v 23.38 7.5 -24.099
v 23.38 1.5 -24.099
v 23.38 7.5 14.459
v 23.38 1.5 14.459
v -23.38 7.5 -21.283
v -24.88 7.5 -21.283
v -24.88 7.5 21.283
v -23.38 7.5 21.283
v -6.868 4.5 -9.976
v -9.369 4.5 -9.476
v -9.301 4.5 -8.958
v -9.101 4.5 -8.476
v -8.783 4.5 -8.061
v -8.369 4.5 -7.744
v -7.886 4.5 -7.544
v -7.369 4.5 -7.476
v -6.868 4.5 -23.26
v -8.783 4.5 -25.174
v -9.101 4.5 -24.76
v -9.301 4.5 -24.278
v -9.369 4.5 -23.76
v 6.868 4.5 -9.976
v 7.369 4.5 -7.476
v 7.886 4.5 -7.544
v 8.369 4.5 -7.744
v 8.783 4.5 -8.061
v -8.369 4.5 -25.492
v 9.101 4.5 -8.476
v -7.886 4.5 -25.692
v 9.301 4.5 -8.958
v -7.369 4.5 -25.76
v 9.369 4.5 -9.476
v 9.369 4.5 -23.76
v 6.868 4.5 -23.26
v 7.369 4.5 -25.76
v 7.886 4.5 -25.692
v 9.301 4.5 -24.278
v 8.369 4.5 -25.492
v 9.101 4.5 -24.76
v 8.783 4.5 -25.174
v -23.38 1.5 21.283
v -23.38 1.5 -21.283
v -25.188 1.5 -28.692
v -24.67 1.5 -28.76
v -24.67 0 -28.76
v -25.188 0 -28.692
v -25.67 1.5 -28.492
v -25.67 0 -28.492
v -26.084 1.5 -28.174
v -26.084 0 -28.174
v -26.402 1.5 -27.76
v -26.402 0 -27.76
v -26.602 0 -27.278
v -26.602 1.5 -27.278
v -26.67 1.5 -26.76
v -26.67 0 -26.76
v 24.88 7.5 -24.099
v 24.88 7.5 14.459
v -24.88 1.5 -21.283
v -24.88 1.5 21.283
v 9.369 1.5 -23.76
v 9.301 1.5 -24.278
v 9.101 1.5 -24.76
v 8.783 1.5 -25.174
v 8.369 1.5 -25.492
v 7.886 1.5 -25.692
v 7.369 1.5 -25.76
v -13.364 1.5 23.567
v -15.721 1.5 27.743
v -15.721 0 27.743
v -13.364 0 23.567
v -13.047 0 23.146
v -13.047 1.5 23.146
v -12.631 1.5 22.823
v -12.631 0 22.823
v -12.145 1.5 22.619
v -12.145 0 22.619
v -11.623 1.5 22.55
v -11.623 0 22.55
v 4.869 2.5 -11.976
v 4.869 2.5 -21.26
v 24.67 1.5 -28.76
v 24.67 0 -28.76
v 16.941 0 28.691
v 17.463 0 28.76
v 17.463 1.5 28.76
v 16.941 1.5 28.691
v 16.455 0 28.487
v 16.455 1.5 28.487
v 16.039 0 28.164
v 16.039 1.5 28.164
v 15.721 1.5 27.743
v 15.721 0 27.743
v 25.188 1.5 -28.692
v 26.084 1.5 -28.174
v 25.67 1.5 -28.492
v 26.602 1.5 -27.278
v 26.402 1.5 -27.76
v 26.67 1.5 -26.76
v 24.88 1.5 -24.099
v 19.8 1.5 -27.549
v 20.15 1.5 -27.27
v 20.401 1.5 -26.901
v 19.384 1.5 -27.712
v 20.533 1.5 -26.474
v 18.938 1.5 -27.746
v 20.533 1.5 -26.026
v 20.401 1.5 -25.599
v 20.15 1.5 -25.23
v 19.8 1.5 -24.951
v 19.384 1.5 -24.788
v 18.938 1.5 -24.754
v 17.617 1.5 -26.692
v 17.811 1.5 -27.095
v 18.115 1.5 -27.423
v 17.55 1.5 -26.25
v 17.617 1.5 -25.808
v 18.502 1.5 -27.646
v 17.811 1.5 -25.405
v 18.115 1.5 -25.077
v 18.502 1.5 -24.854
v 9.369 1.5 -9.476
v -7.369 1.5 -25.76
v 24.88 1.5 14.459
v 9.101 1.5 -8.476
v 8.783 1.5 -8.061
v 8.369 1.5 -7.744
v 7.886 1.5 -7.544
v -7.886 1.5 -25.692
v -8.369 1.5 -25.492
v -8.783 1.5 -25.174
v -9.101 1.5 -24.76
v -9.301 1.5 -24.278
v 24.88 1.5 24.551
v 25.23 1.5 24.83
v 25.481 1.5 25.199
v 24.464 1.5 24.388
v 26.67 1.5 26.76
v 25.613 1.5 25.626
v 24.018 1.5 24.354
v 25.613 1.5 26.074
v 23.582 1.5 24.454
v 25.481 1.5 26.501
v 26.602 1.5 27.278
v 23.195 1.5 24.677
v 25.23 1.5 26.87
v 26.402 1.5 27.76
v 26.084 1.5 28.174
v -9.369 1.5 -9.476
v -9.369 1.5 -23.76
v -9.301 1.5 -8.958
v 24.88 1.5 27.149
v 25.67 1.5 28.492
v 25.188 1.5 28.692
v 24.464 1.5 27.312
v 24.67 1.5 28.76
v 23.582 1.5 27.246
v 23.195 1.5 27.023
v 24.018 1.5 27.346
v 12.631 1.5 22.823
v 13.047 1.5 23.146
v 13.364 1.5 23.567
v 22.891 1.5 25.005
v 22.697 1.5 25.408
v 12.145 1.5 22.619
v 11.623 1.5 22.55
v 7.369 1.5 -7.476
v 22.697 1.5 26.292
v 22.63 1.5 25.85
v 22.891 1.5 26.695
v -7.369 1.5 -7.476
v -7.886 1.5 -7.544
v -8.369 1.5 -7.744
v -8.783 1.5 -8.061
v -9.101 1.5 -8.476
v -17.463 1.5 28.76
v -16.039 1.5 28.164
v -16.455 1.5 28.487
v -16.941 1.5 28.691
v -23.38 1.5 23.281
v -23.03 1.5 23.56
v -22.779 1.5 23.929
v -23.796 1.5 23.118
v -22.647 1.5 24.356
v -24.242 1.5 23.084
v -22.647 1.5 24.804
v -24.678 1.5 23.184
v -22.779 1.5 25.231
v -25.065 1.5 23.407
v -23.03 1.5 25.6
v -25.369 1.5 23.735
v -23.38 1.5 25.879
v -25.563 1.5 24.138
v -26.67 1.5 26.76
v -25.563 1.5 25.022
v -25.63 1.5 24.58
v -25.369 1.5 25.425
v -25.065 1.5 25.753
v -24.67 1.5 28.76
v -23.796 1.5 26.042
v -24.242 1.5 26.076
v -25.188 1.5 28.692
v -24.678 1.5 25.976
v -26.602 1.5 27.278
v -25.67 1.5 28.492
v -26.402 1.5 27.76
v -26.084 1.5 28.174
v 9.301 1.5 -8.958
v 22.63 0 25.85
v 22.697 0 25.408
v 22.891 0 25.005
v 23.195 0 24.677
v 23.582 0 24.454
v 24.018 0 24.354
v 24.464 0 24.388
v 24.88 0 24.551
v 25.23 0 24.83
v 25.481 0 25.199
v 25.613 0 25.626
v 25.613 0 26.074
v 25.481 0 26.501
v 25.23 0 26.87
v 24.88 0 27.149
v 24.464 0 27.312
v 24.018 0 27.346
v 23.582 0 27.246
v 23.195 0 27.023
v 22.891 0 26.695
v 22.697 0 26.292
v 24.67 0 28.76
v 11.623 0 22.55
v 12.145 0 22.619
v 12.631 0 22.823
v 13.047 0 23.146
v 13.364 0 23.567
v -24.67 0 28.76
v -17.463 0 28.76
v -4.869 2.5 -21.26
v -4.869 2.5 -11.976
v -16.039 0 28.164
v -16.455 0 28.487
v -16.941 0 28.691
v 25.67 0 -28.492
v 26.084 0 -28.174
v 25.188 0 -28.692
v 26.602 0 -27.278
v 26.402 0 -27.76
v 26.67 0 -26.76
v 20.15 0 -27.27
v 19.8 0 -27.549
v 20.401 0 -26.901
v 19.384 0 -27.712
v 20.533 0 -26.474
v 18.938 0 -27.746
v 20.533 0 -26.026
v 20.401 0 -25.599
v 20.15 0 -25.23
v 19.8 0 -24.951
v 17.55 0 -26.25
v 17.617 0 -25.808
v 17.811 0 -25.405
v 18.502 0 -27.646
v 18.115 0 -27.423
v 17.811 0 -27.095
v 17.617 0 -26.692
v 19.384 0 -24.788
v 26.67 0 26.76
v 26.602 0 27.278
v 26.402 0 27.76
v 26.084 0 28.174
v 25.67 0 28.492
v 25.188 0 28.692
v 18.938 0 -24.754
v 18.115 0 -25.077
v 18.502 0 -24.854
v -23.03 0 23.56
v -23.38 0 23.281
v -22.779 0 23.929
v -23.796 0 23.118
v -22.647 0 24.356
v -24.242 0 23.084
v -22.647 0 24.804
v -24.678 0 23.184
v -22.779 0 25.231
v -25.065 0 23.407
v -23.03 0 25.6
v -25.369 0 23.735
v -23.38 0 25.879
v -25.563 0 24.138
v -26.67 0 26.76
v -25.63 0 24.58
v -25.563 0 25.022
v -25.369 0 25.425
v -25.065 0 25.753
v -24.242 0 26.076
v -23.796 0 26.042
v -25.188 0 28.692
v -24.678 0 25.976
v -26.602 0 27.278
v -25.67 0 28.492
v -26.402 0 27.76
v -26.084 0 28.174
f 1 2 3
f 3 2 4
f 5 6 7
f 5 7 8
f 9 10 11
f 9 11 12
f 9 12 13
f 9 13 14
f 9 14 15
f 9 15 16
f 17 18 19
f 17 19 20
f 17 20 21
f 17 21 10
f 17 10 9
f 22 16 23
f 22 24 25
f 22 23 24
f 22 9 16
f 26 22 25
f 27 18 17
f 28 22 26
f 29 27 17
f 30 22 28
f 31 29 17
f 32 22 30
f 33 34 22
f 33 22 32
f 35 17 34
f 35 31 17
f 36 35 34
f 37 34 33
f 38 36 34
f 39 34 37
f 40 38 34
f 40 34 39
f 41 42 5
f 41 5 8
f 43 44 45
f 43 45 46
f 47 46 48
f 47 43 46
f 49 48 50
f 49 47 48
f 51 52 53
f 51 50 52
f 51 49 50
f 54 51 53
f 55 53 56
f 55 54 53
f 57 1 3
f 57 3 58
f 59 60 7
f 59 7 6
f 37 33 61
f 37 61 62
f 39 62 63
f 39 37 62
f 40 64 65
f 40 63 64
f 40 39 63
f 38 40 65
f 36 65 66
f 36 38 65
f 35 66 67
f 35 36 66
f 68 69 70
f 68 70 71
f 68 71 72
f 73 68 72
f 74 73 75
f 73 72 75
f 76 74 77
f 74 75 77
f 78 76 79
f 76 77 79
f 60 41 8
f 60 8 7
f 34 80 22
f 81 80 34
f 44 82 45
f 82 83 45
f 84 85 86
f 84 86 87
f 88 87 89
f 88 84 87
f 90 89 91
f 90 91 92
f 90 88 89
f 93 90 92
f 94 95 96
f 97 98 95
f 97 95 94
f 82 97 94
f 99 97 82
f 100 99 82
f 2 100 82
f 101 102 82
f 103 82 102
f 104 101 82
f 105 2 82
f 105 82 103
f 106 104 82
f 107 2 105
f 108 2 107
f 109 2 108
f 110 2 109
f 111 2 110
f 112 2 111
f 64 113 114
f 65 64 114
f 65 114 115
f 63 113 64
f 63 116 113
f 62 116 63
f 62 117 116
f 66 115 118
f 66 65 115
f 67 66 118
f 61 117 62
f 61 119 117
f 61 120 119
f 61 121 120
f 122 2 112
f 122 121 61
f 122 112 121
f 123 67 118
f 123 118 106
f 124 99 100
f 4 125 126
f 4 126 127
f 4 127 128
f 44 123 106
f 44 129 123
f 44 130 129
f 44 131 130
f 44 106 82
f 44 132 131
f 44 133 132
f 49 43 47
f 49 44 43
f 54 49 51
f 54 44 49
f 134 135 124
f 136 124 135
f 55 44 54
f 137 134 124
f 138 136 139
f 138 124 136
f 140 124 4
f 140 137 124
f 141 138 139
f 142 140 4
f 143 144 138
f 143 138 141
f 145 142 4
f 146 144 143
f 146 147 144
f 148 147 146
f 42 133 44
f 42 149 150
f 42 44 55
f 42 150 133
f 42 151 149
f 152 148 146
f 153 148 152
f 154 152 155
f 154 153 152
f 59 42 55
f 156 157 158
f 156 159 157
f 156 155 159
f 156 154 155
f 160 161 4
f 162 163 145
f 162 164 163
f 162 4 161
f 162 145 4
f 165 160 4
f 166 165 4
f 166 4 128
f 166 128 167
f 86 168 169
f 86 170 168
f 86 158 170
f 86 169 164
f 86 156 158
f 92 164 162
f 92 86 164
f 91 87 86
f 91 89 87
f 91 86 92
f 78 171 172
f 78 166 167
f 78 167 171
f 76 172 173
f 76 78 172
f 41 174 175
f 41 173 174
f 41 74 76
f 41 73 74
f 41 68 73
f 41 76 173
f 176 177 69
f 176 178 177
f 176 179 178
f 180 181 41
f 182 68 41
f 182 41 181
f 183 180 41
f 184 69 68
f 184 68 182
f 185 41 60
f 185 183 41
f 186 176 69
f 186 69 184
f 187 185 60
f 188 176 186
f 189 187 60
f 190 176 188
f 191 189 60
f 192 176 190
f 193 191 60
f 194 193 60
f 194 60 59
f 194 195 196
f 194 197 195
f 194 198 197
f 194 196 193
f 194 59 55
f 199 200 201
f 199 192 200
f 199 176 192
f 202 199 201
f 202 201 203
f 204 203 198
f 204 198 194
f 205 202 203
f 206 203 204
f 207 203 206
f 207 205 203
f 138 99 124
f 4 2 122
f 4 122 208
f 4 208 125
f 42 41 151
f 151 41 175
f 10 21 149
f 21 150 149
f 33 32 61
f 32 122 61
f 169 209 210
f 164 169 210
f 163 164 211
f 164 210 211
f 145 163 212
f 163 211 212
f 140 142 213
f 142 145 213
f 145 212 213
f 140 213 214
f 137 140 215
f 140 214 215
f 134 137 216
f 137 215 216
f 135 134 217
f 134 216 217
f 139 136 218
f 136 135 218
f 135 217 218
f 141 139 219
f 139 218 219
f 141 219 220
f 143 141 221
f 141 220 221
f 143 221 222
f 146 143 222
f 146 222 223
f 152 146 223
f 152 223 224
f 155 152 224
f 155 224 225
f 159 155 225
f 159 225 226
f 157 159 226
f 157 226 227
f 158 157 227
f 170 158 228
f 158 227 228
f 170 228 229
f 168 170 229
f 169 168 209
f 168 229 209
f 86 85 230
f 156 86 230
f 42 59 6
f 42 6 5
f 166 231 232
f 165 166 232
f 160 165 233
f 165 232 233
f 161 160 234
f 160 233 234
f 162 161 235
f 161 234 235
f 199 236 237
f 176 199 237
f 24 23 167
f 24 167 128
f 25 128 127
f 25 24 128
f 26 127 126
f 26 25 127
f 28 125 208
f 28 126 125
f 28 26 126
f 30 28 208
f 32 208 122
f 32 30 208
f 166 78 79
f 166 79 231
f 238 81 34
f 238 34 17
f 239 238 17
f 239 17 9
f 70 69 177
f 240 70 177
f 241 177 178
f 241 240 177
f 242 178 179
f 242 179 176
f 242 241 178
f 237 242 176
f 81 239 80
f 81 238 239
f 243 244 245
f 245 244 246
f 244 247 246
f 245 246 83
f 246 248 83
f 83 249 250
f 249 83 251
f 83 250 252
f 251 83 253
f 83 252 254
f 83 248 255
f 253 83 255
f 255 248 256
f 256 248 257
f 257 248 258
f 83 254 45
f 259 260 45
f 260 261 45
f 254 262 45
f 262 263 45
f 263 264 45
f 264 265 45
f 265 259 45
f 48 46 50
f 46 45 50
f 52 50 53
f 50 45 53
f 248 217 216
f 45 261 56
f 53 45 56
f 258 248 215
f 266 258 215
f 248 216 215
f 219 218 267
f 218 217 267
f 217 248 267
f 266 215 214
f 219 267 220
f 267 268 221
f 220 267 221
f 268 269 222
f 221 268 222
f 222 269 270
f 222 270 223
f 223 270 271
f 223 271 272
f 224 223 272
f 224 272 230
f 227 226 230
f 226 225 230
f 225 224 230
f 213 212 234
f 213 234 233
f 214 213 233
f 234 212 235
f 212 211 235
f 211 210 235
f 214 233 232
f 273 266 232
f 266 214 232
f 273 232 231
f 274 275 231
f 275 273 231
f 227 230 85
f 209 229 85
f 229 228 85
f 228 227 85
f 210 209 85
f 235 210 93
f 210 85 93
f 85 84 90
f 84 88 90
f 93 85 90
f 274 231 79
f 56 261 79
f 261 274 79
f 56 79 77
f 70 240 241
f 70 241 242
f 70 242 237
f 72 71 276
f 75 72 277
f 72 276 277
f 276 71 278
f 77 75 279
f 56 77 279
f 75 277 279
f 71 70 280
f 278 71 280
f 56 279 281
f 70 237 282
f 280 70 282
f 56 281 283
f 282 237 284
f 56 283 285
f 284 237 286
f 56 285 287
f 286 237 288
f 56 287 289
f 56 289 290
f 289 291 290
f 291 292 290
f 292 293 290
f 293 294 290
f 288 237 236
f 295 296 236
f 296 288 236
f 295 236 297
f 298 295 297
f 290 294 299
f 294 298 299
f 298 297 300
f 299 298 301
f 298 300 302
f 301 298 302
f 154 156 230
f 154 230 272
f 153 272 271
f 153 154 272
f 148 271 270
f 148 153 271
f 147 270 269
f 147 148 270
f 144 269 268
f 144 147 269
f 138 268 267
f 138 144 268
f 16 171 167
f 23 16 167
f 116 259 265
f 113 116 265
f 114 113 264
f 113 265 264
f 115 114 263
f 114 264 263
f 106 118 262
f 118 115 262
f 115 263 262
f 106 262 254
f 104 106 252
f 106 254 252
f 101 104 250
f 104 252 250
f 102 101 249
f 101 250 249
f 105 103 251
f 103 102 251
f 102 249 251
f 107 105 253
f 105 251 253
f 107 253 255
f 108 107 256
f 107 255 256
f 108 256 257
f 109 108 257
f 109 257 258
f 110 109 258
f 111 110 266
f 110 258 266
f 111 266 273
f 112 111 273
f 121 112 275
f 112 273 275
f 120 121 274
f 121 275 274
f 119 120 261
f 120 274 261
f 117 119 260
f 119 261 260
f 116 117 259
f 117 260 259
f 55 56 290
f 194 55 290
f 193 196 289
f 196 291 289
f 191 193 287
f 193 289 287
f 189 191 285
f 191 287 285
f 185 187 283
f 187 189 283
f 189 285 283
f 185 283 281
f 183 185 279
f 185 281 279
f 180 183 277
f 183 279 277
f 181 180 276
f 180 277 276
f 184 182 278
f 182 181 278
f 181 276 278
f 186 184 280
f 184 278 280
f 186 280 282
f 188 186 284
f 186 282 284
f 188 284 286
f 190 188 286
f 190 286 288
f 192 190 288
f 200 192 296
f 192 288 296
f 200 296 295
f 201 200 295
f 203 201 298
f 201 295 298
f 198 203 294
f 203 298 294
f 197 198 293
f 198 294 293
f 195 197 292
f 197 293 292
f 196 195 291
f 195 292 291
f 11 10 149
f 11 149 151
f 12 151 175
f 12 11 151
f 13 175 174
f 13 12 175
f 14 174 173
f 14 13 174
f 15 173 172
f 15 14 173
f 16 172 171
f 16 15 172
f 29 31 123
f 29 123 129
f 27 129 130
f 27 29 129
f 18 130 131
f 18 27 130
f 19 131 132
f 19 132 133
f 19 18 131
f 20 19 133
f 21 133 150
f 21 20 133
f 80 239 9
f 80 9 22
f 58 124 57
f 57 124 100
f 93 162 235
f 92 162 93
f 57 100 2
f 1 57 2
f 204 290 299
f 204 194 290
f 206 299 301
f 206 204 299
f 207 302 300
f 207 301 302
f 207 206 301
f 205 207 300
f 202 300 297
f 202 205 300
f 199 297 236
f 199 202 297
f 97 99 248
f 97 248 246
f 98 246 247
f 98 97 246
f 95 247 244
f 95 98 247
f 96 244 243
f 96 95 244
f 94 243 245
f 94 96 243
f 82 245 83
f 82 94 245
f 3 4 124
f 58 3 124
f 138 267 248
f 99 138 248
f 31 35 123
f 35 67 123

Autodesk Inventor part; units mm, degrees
ref_plane "YZ Plane" through (0, 0, 0) normal (1, 0, 0) x (0, 1, 0)
ref_plane "XZ Plane" through (0, 0, 0) normal (0, 1, 0) x (-1, 0, 0)
ref_plane "XY Plane" through (0, 0, 0) normal (0, 0, 1) x (1, 0, 0)
sketch "Sketch1" plane through (0, 0, 0) normal (0, 1, 0) x (-1, 0, 0)
  line L0 (-26.67, -28.76) -> (26.67, -28.76)
  line L1 (26.67, -28.76) -> (26.67, 28.76)
  line L2 (26.67, 28.76) -> (-26.67, 28.76)
  line L3 (-26.67, 28.76) -> (-26.67, -28.76)
  line L4 (-26.67, -28.76) -> (26.67, 28.76) construction
  line L5 (26.67, -28.76) -> (-26.67, 28.76) construction
  circle A0 centre (-24.13, 25.85) radius 1.5
  circle A1 centre (24.13, 24.58) radius 1.5
  circle A2 centre (-19.05, -26.25) radius 1.5
  point P0 (0, 0)
  point P1 (0, 0)
  dimension "d0" = 53.34
  dimension "d1" = 57.52
  dimension "d2" = 3
  dimension "d3" = 3
  dimension "d4" = 3
  dimension "d5" = 2.54
  dimension "d6" = 2.91
  dimension "d7" = 50.8
  dimension "d8" = 4.18
  dimension "d9" = 2.51
  dimension "d10" = 7.62
extrude "Extrusion1" add sketch "Sketch1" along normal blind 1.5
sketch "Sketch2" plane through (0, 1.5, 0) normal (0, 1, 0) x (1, 0, 0)
  line L0 (-26.67, 28.76) -> (-26.67, -28.76) projected
  line L1 (-26.67, -28.76) -> (26.67, -28.76) projected
  line L2 (26.67, -28.76) -> (26.67, 28.76) projected
  line L3 (26.67, 28.76) -> (-26.67, 28.76) projected
  circle A0 centre (24.13, -25.85) radius 1.5 projected
  circle A1 centre (-24.13, -24.58) radius 1.5 projected
  circle A2 centre (19.05, 26.25) radius 1.5 projected
  line L4 (-26.67, -28.76) -> (26.67, -28.76) projected
  line L5 (0, -28.76) -> (0, 28.76)
  line L6 (9.3688, 25.76) -> (-9.3688, 25.76)
  line L7 (-9.3688, 25.76) -> (-9.3688, 7.4756)
  line L8 (-9.3688, 7.4756) -> (9.3688, 7.4756)
  line L9 (9.3688, 7.4756) -> (9.3688, 25.76)
  line L10 (9.3688, 25.76) -> (-9.3688, 7.4756) construction
  line L11 (-9.3688, 25.76) -> (9.3688, 7.4756) construction
  point P0 (0, 0)
  point P1 (0, 16.6178)
  dimension "d13" = 36.0388
  dimension "d14" = 3
extrude "Extrusion2" add sketch "Sketch2" along normal blind 3 contours L6 L9 L8 L5 | L5 L8 L7 L6
sketch "Sketch3" plane through (0, 1.5, 0) normal (0, 1, 0) x (1, 0, 0)
  line L0 (9.3688, 25.76) -> (9.3688, 7.4756) projected
  line L1 (9.3688, 7.4756) -> (-9.3688, 7.4756) projected
  line L2 (-9.3688, 7.4756) -> (-9.3688, 25.76) projected
  line L3 (-9.3688, 25.76) -> (9.3688, 25.76) projected
  line L4 (-26.67, 28.76) -> (-26.67, -28.76) projected
  line L5 (-26.67, -28.76) -> (26.67, -28.76) projected
  line L6 (26.67, -28.76) -> (26.67, 28.76) projected
  line L7 (26.67, 28.76) -> (-26.67, 28.76) projected
  circle A0 centre (24.13, -25.85) radius 1.5 projected
  circle A1 centre (-24.13, -24.58) radius 1.5 projected
  circle A2 centre (19.05, 26.25) radius 1.5 projected
  circle A3 centre (24.13, -25.85) radius 1.5 projected
  line L8 (24.13, -25.85) -> (24.13, 28.76)
  line L9 (26.67, 28.76) -> (-26.67, 28.76) projected
  line L10 (-24.13, -24.58) -> (-24.13, 28.76)
  line L11 (24.88, 24.099) -> (23.38, 24.099)
  line L12 (23.38, 24.099) -> (23.38, -14.4594)
  line L13 (23.38, -14.4594) -> (24.88, -14.4594)
  line L14 (24.88, -14.4594) -> (24.88, 24.099)
  line L15 (24.88, 24.099) -> (23.38, -14.4594) construction
  line L16 (23.38, 24.099) -> (24.88, -14.4594) construction
  line L17 (-24.88, 21.2829) -> (-23.38, 21.2829)
  line L18 (-23.38, 21.2829) -> (-23.38, -21.2829)
  line L19 (-23.38, -21.2829) -> (-24.88, -21.2829)
  line L20 (-24.88, -21.2829) -> (-24.88, 21.2829)
  line L21 (-24.88, 21.2829) -> (-23.38, -21.2829) construction
  line L22 (-23.38, 21.2829) -> (-24.88, -21.2829) construction
  point P0 (0, 0)
  point P1 (24.13, 4.8198)
  point P2 (-24.13, 0)
  dimension "d17" = 1.5
  dimension "d18" = 1.5
extrude "Extrusion3" add sketch "Sketch3" along normal blind 6 contours L11 L14 L13 L8 | L8 L13 L12 L11 | L17 L18 L19 L10 | L10 L19 L20 L17
sketch "Sketch4" plane through (0, 4.5, 0) normal (0, 1, 0) x (1, 0, 0)
  line L0 (9.3688, 25.76) -> (-9.3688, 25.76) projected
  line L1 (-9.3688, 25.76) -> (-9.3688, 7.4756) projected
  line L2 (-9.3688, 7.4756) -> (9.3688, 7.4756) projected
  line L3 (9.3688, 7.4756) -> (9.3688, 25.76) projected
  line L4 (4.8688, 11.9756) -> (-4.8688, 11.9756)
  line L5 (-4.8688, 11.9756) -> (-4.8688, 21.26)
  line L6 (-4.8688, 21.26) -> (4.8688, 21.26)
  line L7 (4.8688, 21.26) -> (4.8688, 11.9756)
  point P0 (0, 0)
  dimension "d21" = 4.5
extrude "Extrusion4" cut sketch "Sketch4" against normal blind 2 contours L4 L5 L6 L7
chamfer "Chamfer1" distance 2 angle 45 4 edges at (0, 4.5, -11.9756) (-4.8688, 4.5, -16.6178) (0, 4.5, -21.26) (4.8688, 4.5, -16.6178)
sketch "Sketch5" plane through (0, 1.5, 0) normal (0, 1, 0) x (1, 0, 0)
  line L0 (-26.67, -28.76) -> (26.67, -28.76) projected
  line L1 (-16.2954, -28.76) -> (-12.7903, -22.5498)
  line L2 (-12.7903, -22.5498) -> (0, -22.5498)
  line L3 (12.7903, -22.5498) -> (16.2954, -28.76)
  line L4 (0, -28.76) -> (0, -13.7349)
  line L5 (0, -22.5498) -> (12.7903, -22.5498)
  point P0 (0, 0)
extrude "Extrusion5" cut sketch "Sketch5" against normal through all
fillet "Fillet1" radius 2 8 edges at (26.67, 0.75, -28.76) (-26.67, 0.75, -28.76) (-26.67, 0.75, 28.76) (-16.2954, 0.75, 28.76) (-12.7903, 0.75, 22.5498) (12.7903, 0.75, 22.5498) (16.2954, 0.75, 28.76) (26.67, 0.75, 28.76)
fillet "Fillet2" radius 2 4 edges at (9.3688, 3, -25.76) (9.3688, 3, -7.4756) (-9.3688, 3, -7.4756) (-9.3688, 3, -25.76)
properties part number "mti_3"
